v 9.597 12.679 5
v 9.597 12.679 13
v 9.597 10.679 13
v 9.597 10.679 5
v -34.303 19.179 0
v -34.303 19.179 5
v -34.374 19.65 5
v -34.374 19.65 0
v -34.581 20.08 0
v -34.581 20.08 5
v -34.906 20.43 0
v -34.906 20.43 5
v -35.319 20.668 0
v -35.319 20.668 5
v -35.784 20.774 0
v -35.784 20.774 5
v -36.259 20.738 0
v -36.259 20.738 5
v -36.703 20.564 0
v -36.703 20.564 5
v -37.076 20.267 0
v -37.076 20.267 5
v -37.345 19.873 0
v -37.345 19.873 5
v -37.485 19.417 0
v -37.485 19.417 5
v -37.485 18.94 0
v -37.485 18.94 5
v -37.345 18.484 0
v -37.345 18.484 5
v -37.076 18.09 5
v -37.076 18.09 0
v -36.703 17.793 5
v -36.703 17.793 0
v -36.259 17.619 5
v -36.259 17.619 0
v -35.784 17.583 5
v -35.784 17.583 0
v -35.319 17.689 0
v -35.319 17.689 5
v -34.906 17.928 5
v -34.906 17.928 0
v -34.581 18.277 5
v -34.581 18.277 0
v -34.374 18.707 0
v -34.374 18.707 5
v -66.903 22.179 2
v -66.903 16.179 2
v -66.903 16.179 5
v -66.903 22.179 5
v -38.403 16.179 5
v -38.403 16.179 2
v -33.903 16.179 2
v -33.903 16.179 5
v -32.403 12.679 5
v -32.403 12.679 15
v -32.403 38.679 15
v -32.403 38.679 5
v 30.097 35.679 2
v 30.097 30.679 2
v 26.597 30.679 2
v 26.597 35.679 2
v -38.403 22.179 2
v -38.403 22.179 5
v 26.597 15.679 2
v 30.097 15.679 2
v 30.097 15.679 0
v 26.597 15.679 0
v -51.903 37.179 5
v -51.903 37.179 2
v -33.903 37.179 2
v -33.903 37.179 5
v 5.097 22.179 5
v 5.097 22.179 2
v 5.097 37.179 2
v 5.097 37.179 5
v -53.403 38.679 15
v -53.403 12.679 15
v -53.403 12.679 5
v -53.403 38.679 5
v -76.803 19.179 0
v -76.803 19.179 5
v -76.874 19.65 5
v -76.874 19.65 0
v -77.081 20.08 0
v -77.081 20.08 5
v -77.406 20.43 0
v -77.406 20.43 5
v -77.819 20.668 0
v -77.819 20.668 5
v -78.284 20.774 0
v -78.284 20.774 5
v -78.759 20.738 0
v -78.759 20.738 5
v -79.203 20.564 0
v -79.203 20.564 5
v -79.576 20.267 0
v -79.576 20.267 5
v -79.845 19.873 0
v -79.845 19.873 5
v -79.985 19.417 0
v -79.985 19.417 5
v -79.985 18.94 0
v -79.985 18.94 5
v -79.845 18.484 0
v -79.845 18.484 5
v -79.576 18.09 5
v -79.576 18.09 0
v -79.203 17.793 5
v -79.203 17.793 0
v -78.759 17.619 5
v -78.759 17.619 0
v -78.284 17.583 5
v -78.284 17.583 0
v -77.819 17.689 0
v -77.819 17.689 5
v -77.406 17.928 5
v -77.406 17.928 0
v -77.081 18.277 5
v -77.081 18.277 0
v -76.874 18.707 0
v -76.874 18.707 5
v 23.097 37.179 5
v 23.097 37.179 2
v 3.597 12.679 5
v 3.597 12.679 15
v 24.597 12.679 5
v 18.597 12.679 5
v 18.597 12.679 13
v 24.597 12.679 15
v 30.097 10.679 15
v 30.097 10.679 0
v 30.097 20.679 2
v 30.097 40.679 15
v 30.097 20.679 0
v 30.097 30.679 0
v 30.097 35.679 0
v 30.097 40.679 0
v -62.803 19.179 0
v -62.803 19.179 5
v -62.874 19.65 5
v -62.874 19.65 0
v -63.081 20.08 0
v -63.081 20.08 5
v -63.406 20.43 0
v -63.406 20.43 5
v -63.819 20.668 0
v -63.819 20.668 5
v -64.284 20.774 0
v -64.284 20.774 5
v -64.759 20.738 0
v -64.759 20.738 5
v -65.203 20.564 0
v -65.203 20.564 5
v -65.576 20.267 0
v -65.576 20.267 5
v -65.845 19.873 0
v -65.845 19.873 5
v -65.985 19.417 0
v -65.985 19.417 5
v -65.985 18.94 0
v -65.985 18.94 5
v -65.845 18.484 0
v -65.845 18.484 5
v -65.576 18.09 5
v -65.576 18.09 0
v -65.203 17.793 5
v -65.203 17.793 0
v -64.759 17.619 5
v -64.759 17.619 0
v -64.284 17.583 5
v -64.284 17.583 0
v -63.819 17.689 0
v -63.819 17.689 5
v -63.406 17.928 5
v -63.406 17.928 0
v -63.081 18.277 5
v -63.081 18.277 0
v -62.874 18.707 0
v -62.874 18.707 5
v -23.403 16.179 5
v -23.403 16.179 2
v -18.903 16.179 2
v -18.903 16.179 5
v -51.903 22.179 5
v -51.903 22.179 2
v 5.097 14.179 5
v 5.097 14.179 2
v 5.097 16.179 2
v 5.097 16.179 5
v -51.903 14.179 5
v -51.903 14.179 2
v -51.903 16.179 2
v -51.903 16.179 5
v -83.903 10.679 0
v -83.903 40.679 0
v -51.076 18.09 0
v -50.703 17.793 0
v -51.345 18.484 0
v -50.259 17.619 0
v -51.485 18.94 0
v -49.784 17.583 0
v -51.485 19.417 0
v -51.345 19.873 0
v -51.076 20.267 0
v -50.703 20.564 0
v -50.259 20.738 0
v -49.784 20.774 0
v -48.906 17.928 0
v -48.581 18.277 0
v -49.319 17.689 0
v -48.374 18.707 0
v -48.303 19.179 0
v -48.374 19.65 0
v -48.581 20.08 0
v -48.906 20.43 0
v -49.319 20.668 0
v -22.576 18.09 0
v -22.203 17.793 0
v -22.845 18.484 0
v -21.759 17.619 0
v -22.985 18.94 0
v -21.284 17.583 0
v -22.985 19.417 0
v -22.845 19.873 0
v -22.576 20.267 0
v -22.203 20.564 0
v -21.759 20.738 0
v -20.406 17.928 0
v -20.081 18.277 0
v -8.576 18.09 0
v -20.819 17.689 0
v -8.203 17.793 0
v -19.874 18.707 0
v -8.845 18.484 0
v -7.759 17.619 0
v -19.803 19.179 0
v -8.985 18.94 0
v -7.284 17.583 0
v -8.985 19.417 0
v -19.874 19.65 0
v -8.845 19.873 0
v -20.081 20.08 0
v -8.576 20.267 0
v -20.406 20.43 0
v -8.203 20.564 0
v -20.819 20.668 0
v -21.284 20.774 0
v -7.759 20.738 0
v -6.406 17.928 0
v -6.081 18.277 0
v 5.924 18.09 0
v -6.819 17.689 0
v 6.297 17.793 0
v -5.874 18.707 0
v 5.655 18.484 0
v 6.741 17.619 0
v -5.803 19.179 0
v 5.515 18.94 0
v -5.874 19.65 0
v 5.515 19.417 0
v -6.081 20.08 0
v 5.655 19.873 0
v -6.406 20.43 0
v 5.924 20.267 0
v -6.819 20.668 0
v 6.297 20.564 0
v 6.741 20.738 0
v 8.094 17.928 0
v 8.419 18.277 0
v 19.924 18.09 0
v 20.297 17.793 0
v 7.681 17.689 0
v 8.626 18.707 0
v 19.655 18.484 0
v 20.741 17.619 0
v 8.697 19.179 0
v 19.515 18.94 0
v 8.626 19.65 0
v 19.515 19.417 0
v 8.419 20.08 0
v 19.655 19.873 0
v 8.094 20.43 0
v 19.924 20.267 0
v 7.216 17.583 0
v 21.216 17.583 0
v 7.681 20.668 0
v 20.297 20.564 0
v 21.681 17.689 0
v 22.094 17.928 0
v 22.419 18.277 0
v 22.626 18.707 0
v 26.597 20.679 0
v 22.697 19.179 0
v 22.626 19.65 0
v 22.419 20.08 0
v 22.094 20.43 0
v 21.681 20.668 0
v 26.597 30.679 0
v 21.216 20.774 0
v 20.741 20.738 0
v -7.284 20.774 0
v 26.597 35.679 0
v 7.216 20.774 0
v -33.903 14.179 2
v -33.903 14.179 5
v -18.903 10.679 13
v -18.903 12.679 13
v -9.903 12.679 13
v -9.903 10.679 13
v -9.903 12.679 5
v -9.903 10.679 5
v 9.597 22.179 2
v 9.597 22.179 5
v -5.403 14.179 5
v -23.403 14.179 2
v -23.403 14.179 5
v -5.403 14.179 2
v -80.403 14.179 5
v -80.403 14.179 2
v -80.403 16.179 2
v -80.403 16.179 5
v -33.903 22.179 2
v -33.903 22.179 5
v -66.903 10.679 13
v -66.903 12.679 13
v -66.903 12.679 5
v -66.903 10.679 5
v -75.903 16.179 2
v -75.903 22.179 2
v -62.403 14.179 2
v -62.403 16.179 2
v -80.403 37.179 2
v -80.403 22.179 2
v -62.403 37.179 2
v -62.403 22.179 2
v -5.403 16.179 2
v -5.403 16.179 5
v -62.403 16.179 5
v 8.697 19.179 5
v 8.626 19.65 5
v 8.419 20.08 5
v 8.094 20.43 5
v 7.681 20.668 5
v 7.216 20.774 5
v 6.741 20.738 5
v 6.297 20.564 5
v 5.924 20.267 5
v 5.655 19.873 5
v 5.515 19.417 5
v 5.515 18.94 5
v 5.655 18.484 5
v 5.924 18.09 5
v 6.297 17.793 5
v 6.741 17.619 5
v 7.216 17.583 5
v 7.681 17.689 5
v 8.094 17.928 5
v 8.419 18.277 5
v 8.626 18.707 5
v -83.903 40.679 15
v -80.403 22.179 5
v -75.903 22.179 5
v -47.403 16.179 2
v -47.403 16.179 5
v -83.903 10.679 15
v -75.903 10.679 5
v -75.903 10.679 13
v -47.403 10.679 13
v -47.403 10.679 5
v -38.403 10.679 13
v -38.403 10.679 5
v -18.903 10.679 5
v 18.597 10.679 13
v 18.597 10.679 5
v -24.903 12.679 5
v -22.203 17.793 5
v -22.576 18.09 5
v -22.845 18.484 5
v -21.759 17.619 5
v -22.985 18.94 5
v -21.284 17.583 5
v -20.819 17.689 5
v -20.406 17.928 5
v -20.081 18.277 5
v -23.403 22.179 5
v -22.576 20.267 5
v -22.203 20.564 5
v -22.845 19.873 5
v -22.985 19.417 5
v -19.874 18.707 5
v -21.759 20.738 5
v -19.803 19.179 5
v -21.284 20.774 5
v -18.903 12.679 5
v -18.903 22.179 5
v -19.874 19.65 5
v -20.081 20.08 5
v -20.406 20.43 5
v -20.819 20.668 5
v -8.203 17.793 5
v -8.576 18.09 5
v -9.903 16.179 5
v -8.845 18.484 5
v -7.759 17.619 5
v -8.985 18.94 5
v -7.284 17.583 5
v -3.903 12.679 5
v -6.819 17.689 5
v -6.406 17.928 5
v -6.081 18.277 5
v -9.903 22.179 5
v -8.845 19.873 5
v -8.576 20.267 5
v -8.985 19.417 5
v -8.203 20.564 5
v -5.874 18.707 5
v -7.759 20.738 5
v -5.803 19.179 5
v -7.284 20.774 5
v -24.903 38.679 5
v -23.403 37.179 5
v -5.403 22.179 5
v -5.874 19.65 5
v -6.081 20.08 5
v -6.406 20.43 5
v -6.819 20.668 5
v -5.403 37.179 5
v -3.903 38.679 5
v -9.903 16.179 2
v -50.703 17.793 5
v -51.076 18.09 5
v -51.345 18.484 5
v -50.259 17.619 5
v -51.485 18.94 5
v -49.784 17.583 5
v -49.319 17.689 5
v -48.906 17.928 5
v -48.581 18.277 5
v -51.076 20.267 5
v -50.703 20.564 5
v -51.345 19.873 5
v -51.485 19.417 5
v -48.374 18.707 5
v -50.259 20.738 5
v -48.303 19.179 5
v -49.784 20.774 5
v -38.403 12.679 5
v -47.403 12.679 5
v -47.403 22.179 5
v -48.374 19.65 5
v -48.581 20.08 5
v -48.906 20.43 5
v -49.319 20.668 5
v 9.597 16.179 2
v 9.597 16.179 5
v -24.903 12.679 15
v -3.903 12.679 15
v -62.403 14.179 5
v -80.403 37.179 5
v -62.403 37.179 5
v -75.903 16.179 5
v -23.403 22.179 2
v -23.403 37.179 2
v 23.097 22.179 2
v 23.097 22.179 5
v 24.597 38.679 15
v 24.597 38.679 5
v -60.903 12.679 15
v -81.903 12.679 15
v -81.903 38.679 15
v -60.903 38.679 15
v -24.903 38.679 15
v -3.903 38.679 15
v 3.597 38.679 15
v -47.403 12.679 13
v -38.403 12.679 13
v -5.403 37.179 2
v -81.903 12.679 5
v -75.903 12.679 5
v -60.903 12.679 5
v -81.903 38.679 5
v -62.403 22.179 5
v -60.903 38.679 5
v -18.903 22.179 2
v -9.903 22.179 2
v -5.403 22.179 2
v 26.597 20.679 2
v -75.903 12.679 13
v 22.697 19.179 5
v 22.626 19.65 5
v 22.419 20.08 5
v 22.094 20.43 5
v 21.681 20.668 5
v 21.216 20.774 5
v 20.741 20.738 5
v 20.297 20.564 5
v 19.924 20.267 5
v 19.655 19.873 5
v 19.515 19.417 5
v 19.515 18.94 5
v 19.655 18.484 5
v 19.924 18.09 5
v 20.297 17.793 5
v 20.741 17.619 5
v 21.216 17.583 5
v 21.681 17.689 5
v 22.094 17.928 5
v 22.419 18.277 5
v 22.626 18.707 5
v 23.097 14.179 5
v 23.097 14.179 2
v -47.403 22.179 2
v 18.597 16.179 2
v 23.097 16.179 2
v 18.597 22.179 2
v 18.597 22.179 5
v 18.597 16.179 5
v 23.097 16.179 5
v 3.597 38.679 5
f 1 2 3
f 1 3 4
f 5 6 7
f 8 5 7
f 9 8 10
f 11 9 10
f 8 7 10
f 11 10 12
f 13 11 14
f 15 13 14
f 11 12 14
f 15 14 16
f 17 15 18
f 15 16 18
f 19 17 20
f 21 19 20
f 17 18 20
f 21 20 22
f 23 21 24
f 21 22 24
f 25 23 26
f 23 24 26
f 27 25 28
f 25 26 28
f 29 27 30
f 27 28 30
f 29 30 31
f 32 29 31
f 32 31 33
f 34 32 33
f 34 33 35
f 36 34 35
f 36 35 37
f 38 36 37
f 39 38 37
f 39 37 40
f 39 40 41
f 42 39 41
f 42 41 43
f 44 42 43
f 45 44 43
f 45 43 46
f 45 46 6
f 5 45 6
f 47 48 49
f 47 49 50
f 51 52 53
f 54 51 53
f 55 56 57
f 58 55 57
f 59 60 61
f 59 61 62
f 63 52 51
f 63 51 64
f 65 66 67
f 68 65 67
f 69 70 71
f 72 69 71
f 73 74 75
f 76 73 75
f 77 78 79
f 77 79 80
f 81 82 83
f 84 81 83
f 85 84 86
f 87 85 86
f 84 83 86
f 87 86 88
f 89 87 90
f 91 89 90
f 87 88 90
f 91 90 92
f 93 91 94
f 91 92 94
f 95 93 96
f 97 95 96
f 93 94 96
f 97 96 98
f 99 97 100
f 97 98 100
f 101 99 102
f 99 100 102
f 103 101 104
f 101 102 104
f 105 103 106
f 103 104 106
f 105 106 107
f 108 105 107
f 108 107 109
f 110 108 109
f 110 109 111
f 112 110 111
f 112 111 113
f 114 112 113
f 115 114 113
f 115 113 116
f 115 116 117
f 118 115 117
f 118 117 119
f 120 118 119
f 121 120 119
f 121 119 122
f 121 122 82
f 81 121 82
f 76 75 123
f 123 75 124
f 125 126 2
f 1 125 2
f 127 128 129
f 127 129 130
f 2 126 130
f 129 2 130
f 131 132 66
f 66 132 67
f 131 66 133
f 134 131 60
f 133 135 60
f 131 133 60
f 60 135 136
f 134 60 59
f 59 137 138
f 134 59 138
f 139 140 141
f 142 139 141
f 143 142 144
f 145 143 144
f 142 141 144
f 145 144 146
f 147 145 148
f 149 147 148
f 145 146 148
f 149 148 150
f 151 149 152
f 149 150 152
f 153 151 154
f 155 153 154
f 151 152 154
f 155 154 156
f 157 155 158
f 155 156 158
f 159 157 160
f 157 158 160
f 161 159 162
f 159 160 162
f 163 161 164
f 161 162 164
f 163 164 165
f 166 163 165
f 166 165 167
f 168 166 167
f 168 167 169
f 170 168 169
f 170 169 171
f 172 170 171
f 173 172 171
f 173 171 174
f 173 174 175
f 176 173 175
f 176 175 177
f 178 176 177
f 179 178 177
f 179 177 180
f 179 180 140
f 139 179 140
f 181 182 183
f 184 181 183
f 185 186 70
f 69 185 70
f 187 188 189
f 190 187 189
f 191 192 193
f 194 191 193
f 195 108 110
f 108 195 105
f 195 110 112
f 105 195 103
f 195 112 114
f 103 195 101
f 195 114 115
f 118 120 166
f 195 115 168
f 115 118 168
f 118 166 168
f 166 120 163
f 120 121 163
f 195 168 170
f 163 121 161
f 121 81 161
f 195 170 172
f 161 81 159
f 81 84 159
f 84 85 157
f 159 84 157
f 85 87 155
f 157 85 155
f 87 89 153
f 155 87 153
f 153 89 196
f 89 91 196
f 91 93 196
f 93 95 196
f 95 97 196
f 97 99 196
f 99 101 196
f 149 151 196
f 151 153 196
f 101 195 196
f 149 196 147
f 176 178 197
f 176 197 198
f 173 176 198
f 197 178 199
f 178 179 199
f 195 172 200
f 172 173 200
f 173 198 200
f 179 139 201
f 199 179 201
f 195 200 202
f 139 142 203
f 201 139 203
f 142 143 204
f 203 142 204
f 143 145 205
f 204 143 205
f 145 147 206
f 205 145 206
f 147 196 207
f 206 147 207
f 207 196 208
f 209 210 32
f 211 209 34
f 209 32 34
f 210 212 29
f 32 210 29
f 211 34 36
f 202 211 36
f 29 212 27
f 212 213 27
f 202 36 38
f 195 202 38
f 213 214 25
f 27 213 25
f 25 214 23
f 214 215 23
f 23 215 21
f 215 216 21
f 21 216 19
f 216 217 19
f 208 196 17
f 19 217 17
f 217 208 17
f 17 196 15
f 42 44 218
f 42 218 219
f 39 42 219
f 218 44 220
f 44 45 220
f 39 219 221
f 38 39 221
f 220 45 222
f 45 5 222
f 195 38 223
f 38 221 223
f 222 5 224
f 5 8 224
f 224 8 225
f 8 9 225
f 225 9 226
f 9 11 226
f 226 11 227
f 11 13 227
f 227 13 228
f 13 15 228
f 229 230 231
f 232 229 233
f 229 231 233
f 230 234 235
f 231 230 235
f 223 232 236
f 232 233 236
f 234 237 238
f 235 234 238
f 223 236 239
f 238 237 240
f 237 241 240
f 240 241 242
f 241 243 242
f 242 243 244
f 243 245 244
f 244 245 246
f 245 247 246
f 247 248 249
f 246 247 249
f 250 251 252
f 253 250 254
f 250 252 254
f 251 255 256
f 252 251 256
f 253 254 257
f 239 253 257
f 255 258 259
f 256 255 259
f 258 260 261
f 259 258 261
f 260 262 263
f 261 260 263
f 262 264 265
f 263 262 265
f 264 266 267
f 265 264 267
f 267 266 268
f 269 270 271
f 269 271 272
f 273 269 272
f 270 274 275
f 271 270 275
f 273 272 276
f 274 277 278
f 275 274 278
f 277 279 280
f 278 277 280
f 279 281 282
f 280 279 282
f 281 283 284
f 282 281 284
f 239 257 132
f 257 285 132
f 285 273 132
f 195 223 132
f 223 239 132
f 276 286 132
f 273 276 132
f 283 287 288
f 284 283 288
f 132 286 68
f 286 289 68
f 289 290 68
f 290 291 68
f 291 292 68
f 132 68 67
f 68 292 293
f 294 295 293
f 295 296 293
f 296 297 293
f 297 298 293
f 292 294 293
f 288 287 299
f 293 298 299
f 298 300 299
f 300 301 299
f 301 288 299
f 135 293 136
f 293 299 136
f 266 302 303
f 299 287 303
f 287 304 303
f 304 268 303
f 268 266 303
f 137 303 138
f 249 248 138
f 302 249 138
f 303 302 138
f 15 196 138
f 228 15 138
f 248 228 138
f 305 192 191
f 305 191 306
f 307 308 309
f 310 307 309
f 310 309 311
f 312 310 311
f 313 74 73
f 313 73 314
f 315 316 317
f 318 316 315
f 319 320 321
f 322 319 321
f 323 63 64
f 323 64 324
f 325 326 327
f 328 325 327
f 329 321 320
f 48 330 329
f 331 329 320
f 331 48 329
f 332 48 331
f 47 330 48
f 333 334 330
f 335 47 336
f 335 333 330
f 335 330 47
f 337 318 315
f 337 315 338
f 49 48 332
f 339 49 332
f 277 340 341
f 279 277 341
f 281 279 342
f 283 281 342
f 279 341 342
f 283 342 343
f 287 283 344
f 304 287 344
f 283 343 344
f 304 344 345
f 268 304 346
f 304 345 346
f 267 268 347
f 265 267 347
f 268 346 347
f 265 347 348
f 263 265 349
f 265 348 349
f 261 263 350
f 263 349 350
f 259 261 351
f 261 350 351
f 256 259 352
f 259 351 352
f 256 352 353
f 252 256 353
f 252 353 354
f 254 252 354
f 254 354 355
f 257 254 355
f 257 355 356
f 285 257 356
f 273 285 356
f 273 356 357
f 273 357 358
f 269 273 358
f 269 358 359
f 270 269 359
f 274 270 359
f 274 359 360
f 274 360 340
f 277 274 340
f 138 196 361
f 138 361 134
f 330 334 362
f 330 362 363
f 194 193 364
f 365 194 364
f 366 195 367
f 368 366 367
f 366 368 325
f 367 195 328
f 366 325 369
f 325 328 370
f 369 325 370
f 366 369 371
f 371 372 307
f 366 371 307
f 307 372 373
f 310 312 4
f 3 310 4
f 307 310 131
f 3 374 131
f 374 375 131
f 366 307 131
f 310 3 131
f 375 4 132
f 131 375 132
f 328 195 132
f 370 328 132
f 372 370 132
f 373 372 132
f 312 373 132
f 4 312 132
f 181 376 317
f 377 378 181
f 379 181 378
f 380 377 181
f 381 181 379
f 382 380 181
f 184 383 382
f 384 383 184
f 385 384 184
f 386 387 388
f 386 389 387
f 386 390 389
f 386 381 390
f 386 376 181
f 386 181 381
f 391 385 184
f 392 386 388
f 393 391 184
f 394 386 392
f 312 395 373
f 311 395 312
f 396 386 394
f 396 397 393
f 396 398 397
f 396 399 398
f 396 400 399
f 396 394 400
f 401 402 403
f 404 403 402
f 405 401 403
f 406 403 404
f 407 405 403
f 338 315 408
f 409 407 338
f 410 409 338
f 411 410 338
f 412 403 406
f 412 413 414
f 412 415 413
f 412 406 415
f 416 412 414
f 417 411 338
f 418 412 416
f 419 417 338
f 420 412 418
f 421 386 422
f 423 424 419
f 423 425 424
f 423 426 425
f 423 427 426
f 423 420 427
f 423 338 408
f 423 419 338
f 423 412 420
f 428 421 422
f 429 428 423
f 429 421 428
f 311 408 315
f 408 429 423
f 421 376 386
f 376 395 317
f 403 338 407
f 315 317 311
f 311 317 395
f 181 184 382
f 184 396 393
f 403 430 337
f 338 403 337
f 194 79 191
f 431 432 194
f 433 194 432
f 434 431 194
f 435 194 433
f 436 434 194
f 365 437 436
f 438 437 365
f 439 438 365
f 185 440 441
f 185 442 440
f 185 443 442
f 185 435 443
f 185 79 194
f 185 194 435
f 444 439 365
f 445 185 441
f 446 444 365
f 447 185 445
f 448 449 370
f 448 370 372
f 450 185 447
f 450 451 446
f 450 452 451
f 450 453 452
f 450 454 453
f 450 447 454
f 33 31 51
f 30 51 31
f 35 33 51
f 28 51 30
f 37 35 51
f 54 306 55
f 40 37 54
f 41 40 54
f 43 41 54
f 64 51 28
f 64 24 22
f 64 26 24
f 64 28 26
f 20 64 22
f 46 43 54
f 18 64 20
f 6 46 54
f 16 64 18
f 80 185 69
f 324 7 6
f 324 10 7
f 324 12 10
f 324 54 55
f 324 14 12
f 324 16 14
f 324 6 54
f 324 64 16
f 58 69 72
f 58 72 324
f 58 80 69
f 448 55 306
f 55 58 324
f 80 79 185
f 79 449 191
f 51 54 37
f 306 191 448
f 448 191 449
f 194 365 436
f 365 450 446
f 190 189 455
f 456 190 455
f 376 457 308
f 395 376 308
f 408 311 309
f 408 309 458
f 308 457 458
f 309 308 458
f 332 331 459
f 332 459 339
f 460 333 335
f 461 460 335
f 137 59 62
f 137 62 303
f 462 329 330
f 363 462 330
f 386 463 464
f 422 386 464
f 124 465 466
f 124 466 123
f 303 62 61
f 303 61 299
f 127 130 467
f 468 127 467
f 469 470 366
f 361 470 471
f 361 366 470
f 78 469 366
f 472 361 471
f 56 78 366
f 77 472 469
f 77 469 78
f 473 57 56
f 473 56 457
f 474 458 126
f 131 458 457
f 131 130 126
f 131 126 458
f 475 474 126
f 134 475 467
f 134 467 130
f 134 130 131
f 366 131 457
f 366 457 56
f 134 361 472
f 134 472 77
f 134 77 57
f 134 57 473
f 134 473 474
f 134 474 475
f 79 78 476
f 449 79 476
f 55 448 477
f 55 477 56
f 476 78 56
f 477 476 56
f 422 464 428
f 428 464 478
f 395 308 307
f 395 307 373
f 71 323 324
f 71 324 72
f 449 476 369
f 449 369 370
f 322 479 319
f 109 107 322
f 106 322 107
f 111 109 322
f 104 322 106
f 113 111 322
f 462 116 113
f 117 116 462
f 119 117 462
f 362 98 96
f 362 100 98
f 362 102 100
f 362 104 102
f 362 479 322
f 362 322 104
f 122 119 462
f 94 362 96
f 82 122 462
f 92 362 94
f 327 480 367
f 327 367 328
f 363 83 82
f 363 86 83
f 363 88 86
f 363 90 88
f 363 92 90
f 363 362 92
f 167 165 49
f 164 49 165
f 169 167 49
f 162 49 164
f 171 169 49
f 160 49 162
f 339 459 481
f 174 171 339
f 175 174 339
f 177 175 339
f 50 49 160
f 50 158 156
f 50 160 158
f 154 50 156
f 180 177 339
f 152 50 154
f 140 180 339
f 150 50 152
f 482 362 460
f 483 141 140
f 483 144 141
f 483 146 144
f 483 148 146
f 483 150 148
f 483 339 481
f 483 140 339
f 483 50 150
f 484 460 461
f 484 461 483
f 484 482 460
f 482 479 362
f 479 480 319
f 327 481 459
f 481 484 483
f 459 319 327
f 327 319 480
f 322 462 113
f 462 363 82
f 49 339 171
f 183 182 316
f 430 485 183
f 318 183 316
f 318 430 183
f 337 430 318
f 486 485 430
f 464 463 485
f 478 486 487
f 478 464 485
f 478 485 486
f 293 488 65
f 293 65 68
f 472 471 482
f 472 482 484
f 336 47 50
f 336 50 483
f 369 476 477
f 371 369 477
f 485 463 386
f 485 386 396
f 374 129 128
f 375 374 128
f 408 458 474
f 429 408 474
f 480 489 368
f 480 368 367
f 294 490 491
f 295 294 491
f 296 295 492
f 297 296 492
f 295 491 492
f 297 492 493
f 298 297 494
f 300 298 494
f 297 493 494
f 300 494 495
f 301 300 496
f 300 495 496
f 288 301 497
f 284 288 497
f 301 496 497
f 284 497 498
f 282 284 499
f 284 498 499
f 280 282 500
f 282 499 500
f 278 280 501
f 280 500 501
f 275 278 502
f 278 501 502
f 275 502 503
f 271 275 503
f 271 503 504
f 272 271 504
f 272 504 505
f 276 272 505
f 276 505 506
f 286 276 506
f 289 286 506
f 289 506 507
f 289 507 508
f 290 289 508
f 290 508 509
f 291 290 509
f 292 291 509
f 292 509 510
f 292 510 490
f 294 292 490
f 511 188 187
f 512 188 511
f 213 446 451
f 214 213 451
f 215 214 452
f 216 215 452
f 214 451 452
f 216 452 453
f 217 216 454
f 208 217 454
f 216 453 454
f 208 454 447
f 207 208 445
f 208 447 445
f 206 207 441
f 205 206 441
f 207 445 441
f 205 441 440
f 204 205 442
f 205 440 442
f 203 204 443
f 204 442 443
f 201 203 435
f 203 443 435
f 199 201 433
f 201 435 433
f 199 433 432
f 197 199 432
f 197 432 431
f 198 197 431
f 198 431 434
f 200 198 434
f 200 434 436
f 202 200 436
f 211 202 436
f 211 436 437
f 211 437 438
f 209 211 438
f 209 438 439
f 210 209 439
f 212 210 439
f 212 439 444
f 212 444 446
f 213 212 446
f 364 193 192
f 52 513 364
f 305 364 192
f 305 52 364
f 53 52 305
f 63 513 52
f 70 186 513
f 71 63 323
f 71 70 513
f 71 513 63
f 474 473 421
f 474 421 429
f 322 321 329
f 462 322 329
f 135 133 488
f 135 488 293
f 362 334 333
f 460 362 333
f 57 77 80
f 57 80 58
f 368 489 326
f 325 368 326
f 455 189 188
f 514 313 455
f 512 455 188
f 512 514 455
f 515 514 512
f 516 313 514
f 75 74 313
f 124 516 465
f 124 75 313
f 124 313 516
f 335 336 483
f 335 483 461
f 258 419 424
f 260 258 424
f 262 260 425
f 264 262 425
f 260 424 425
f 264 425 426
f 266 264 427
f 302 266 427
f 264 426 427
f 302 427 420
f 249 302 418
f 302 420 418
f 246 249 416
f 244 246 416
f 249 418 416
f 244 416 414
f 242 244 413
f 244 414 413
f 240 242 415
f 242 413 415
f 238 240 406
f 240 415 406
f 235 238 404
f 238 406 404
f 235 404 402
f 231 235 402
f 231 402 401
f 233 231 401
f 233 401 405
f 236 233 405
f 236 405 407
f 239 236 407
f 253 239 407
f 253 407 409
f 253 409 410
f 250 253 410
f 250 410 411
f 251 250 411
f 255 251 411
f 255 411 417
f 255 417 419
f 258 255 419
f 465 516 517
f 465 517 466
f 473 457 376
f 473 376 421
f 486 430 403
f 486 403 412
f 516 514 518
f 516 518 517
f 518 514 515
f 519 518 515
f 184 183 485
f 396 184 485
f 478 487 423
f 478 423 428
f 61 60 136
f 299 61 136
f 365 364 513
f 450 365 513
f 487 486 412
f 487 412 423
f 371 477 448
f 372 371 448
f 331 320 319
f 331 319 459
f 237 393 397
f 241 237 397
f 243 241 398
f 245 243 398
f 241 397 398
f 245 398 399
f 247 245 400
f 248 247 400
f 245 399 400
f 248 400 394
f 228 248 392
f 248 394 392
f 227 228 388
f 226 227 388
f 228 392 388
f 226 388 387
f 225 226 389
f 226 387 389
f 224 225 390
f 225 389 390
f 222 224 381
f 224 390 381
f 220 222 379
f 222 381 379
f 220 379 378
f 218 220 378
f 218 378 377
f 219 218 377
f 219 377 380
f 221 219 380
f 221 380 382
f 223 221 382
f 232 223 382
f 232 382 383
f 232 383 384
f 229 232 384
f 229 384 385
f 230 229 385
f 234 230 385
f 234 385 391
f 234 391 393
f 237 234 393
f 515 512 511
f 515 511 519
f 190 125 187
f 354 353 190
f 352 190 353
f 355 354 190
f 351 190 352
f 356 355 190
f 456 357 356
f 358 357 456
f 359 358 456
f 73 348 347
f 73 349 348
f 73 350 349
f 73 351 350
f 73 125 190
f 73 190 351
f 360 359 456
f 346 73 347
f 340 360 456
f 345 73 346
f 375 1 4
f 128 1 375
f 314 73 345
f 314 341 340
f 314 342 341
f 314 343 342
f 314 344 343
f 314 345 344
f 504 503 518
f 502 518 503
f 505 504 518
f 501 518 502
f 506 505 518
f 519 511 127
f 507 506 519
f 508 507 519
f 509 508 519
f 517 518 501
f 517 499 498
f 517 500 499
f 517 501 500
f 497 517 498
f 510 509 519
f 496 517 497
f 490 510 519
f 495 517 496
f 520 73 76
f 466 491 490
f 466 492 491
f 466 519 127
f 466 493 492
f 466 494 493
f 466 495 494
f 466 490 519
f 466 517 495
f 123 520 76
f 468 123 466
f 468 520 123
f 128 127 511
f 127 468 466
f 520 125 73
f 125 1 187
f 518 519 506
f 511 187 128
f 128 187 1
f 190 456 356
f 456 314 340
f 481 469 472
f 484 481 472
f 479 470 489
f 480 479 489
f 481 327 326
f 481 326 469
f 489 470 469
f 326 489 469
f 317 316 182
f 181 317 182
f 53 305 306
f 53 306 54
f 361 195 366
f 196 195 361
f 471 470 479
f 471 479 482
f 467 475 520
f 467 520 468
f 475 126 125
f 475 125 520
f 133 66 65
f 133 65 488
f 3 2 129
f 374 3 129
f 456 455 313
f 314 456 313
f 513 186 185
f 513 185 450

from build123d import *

# Parameters (mm, degrees)
SKETCH_1_W          = 114
SKETCH_1_H          = 30
EXTRUDE_1_DEPTH     = 15
SKETCH_2_W          = 21
SKETCH_2_H          = 26
CUT_EXTRUDE_1_DEPTH = 13
SKETCH_3_W          = 21
SKETCH_3_H          = 26
SKETCH_3_W_2        = 18
SKETCH_3_H_2        = 23
EXTRUDE_2_DEPTH     = 3
SKETCH_5_W          = 4.5
SKETCH_5_H          = 6
EXTRUDE_3_DEPTH     = 3
SKETCH_6_R          = 1.6
CUT_EXTRUDE_2_DEPTH = 94.778887913
SKETCH_7_W          = 9
SKETCH_7_H          = 8
CUT_EXTRUDE_3_DEPTH = 90.714734825
SKETCH_12_W         = 2
SKETCH_12_H         = 5
CUT_EXTRUDE_4_DEPTH = 3.5


with BuildPart() as part:
    # ｽｹｯﾁ1 → ﾎﾞｽ - 押し出し1 (new body)
    with BuildSketch(Plane.XY):
        with Locations((-26.90312059, 25.678571429)):
            Rectangle(SKETCH_1_W, SKETCH_1_H)
    extrude(amount=EXTRUDE_1_DEPTH)

    # ｽｹｯﾁ2 → ｶｯﾄ - 押し出し1 (cut)
    with BuildSketch(Plane.XY.offset(15)):
        with Locations((-71.40312059, 25.678571429)):
            Rectangle(SKETCH_2_W, SKETCH_2_H)
        with Locations((-42.90312059, 25.678571429)):
            Rectangle(SKETCH_2_W, SKETCH_2_H)
        with Locations((-14.40312059, 25.678571429)):
            Rectangle(SKETCH_2_W, SKETCH_2_H)
        with Locations((14.09687941, 25.678571429)):
            Rectangle(SKETCH_2_W, SKETCH_2_H)
    extrude(amount=-CUT_EXTRUDE_1_DEPTH, mode=Mode.SUBTRACT)

    # ｽｹｯﾁ3 → ﾎﾞｽ - 押し出し2 (add)
    # profile 1 of 4: a face of its own
    with BuildSketch(Plane.XY.offset(2)):
        with Locations((-71.40312059, 25.678571429)):
            Rectangle(SKETCH_3_W, SKETCH_3_H)
        with Locations((-71.40312059, 25.678571429)):
            Rectangle(SKETCH_3_W_2, SKETCH_3_H_2, mode=Mode.SUBTRACT)
    # profile 2 of 4: a face of its own
    with BuildSketch(Plane.XY.offset(2)):
        with Locations((-42.90312059, 25.678571429)):
            Rectangle(SKETCH_3_W, SKETCH_3_H)
        with Locations((-42.90312059, 25.678571429)):
            Rectangle(SKETCH_3_W_2, SKETCH_3_H_2, mode=Mode.SUBTRACT)
    # profile 3 of 4: a face of its own
    with BuildSketch(Plane.XY.offset(2)):
        with Locations((-14.40312059, 25.678571429)):
            Rectangle(SKETCH_3_W, SKETCH_3_H)
        with Locations((-14.40312059, 25.678571429)):
            Rectangle(SKETCH_3_W_2, SKETCH_3_H_2, mode=Mode.SUBTRACT)
    # profile 4 of 4: a face of its own
    with BuildSketch(Plane.XY.offset(2)):
        with Locations((14.09687941, 25.678571429)):
            Rectangle(SKETCH_3_W, SKETCH_3_H)
        with Locations((14.09687941, 25.678571429)):
            Rectangle(SKETCH_3_W_2, SKETCH_3_H_2, mode=Mode.SUBTRACT)
    extrude(amount=EXTRUDE_2_DEPTH)

    # ｽｹｯﾁ5 → ﾎﾞｽ - 押し出し3 (add)
    with BuildSketch(Plane.XY.offset(2)):
        with Locations((-64.65312059, 19.178571429)):
            Rectangle(SKETCH_5_W, SKETCH_5_H)
        with Locations((-78.15312059, 19.178571429)):
            Rectangle(SKETCH_5_W, SKETCH_5_H)
        with Locations((-49.65312059, 19.178571429)):
            Rectangle(SKETCH_5_W, SKETCH_5_H)
        with Locations((-36.15312059, 19.178571429)):
            Rectangle(SKETCH_5_W, SKETCH_5_H)
        with Locations((-21.15312059, 19.178571429)):
            Rectangle(SKETCH_5_W, SKETCH_5_H)
        with Locations((-7.65312059, 19.178571429)):
            Rectangle(SKETCH_5_W, SKETCH_5_H)
        with Locations((7.34687941, 19.178571429)):
            Rectangle(SKETCH_5_W, SKETCH_5_H)
        with Locations((20.84687941, 19.178571429)):
            Rectangle(SKETCH_5_W, SKETCH_5_H)
    extrude(amount=EXTRUDE_3_DEPTH)

    # ｽｹｯﾁ6 → ｶｯﾄ - 押し出し2 (cut, through all)
    with BuildSketch(Plane.XY.offset(5)):
        with Locations((-64.40312059, 19.178571429)):
            Circle(SKETCH_6_R)
        with Locations((-78.40312059, 19.178571429)):
            Circle(SKETCH_6_R)
        with Locations((-49.90312059, 19.178571429)):
            Circle(SKETCH_6_R)
        with Locations((-35.90312059, 19.178571429)):
            Circle(SKETCH_6_R)
        with Locations((-21.40312059, 19.178571429)):
            Circle(SKETCH_6_R)
        with Locations((-7.40312059, 19.178571429)):
            Circle(SKETCH_6_R)
        with Locations((7.09687941, 19.178571429)):
            Circle(SKETCH_6_R)
        with Locations((21.09687941, 19.178571429)):
            Circle(SKETCH_6_R)
    extrude(amount=-CUT_EXTRUDE_2_DEPTH, mode=Mode.SUBTRACT)

    # ｽｹｯﾁ7 → ｶｯﾄ - 押し出し3 (cut, through all)
    with BuildSketch(Plane(origin=(0, 12.678571429, 0), x_dir=(1, 0, 0), z_dir=(0, 1, 0))):
        with Locations((-71.40312059, -9)):
            Rectangle(SKETCH_7_W, SKETCH_7_H)
        with Locations((-42.90312059, -9)):
            Rectangle(SKETCH_7_W, SKETCH_7_H)
        with Locations((-14.40312059, -9)):
            Rectangle(SKETCH_7_W, SKETCH_7_H)
        with Locations((14.09687941, -9)):
            Rectangle(SKETCH_7_W, SKETCH_7_H)
    extrude(amount=-CUT_EXTRUDE_3_DEPTH, mode=Mode.SUBTRACT)

    # ｽｹｯﾁ12 → ｶｯﾄ - 押し出し4 (cut)
    with BuildSketch(Plane(origin=(30.09687941, 0, 0), x_dir=(0, 0, -1), z_dir=(1, 0, 0))):
        with Locations((-1, 18.178571429)):
            Rectangle(SKETCH_12_W, SKETCH_12_H)
        with Locations((-1, 33.178571429)):
            Rectangle(SKETCH_12_W, SKETCH_12_H)
    extrude(amount=-CUT_EXTRUDE_4_DEPTH, mode=Mode.SUBTRACT)


solid = part.part
